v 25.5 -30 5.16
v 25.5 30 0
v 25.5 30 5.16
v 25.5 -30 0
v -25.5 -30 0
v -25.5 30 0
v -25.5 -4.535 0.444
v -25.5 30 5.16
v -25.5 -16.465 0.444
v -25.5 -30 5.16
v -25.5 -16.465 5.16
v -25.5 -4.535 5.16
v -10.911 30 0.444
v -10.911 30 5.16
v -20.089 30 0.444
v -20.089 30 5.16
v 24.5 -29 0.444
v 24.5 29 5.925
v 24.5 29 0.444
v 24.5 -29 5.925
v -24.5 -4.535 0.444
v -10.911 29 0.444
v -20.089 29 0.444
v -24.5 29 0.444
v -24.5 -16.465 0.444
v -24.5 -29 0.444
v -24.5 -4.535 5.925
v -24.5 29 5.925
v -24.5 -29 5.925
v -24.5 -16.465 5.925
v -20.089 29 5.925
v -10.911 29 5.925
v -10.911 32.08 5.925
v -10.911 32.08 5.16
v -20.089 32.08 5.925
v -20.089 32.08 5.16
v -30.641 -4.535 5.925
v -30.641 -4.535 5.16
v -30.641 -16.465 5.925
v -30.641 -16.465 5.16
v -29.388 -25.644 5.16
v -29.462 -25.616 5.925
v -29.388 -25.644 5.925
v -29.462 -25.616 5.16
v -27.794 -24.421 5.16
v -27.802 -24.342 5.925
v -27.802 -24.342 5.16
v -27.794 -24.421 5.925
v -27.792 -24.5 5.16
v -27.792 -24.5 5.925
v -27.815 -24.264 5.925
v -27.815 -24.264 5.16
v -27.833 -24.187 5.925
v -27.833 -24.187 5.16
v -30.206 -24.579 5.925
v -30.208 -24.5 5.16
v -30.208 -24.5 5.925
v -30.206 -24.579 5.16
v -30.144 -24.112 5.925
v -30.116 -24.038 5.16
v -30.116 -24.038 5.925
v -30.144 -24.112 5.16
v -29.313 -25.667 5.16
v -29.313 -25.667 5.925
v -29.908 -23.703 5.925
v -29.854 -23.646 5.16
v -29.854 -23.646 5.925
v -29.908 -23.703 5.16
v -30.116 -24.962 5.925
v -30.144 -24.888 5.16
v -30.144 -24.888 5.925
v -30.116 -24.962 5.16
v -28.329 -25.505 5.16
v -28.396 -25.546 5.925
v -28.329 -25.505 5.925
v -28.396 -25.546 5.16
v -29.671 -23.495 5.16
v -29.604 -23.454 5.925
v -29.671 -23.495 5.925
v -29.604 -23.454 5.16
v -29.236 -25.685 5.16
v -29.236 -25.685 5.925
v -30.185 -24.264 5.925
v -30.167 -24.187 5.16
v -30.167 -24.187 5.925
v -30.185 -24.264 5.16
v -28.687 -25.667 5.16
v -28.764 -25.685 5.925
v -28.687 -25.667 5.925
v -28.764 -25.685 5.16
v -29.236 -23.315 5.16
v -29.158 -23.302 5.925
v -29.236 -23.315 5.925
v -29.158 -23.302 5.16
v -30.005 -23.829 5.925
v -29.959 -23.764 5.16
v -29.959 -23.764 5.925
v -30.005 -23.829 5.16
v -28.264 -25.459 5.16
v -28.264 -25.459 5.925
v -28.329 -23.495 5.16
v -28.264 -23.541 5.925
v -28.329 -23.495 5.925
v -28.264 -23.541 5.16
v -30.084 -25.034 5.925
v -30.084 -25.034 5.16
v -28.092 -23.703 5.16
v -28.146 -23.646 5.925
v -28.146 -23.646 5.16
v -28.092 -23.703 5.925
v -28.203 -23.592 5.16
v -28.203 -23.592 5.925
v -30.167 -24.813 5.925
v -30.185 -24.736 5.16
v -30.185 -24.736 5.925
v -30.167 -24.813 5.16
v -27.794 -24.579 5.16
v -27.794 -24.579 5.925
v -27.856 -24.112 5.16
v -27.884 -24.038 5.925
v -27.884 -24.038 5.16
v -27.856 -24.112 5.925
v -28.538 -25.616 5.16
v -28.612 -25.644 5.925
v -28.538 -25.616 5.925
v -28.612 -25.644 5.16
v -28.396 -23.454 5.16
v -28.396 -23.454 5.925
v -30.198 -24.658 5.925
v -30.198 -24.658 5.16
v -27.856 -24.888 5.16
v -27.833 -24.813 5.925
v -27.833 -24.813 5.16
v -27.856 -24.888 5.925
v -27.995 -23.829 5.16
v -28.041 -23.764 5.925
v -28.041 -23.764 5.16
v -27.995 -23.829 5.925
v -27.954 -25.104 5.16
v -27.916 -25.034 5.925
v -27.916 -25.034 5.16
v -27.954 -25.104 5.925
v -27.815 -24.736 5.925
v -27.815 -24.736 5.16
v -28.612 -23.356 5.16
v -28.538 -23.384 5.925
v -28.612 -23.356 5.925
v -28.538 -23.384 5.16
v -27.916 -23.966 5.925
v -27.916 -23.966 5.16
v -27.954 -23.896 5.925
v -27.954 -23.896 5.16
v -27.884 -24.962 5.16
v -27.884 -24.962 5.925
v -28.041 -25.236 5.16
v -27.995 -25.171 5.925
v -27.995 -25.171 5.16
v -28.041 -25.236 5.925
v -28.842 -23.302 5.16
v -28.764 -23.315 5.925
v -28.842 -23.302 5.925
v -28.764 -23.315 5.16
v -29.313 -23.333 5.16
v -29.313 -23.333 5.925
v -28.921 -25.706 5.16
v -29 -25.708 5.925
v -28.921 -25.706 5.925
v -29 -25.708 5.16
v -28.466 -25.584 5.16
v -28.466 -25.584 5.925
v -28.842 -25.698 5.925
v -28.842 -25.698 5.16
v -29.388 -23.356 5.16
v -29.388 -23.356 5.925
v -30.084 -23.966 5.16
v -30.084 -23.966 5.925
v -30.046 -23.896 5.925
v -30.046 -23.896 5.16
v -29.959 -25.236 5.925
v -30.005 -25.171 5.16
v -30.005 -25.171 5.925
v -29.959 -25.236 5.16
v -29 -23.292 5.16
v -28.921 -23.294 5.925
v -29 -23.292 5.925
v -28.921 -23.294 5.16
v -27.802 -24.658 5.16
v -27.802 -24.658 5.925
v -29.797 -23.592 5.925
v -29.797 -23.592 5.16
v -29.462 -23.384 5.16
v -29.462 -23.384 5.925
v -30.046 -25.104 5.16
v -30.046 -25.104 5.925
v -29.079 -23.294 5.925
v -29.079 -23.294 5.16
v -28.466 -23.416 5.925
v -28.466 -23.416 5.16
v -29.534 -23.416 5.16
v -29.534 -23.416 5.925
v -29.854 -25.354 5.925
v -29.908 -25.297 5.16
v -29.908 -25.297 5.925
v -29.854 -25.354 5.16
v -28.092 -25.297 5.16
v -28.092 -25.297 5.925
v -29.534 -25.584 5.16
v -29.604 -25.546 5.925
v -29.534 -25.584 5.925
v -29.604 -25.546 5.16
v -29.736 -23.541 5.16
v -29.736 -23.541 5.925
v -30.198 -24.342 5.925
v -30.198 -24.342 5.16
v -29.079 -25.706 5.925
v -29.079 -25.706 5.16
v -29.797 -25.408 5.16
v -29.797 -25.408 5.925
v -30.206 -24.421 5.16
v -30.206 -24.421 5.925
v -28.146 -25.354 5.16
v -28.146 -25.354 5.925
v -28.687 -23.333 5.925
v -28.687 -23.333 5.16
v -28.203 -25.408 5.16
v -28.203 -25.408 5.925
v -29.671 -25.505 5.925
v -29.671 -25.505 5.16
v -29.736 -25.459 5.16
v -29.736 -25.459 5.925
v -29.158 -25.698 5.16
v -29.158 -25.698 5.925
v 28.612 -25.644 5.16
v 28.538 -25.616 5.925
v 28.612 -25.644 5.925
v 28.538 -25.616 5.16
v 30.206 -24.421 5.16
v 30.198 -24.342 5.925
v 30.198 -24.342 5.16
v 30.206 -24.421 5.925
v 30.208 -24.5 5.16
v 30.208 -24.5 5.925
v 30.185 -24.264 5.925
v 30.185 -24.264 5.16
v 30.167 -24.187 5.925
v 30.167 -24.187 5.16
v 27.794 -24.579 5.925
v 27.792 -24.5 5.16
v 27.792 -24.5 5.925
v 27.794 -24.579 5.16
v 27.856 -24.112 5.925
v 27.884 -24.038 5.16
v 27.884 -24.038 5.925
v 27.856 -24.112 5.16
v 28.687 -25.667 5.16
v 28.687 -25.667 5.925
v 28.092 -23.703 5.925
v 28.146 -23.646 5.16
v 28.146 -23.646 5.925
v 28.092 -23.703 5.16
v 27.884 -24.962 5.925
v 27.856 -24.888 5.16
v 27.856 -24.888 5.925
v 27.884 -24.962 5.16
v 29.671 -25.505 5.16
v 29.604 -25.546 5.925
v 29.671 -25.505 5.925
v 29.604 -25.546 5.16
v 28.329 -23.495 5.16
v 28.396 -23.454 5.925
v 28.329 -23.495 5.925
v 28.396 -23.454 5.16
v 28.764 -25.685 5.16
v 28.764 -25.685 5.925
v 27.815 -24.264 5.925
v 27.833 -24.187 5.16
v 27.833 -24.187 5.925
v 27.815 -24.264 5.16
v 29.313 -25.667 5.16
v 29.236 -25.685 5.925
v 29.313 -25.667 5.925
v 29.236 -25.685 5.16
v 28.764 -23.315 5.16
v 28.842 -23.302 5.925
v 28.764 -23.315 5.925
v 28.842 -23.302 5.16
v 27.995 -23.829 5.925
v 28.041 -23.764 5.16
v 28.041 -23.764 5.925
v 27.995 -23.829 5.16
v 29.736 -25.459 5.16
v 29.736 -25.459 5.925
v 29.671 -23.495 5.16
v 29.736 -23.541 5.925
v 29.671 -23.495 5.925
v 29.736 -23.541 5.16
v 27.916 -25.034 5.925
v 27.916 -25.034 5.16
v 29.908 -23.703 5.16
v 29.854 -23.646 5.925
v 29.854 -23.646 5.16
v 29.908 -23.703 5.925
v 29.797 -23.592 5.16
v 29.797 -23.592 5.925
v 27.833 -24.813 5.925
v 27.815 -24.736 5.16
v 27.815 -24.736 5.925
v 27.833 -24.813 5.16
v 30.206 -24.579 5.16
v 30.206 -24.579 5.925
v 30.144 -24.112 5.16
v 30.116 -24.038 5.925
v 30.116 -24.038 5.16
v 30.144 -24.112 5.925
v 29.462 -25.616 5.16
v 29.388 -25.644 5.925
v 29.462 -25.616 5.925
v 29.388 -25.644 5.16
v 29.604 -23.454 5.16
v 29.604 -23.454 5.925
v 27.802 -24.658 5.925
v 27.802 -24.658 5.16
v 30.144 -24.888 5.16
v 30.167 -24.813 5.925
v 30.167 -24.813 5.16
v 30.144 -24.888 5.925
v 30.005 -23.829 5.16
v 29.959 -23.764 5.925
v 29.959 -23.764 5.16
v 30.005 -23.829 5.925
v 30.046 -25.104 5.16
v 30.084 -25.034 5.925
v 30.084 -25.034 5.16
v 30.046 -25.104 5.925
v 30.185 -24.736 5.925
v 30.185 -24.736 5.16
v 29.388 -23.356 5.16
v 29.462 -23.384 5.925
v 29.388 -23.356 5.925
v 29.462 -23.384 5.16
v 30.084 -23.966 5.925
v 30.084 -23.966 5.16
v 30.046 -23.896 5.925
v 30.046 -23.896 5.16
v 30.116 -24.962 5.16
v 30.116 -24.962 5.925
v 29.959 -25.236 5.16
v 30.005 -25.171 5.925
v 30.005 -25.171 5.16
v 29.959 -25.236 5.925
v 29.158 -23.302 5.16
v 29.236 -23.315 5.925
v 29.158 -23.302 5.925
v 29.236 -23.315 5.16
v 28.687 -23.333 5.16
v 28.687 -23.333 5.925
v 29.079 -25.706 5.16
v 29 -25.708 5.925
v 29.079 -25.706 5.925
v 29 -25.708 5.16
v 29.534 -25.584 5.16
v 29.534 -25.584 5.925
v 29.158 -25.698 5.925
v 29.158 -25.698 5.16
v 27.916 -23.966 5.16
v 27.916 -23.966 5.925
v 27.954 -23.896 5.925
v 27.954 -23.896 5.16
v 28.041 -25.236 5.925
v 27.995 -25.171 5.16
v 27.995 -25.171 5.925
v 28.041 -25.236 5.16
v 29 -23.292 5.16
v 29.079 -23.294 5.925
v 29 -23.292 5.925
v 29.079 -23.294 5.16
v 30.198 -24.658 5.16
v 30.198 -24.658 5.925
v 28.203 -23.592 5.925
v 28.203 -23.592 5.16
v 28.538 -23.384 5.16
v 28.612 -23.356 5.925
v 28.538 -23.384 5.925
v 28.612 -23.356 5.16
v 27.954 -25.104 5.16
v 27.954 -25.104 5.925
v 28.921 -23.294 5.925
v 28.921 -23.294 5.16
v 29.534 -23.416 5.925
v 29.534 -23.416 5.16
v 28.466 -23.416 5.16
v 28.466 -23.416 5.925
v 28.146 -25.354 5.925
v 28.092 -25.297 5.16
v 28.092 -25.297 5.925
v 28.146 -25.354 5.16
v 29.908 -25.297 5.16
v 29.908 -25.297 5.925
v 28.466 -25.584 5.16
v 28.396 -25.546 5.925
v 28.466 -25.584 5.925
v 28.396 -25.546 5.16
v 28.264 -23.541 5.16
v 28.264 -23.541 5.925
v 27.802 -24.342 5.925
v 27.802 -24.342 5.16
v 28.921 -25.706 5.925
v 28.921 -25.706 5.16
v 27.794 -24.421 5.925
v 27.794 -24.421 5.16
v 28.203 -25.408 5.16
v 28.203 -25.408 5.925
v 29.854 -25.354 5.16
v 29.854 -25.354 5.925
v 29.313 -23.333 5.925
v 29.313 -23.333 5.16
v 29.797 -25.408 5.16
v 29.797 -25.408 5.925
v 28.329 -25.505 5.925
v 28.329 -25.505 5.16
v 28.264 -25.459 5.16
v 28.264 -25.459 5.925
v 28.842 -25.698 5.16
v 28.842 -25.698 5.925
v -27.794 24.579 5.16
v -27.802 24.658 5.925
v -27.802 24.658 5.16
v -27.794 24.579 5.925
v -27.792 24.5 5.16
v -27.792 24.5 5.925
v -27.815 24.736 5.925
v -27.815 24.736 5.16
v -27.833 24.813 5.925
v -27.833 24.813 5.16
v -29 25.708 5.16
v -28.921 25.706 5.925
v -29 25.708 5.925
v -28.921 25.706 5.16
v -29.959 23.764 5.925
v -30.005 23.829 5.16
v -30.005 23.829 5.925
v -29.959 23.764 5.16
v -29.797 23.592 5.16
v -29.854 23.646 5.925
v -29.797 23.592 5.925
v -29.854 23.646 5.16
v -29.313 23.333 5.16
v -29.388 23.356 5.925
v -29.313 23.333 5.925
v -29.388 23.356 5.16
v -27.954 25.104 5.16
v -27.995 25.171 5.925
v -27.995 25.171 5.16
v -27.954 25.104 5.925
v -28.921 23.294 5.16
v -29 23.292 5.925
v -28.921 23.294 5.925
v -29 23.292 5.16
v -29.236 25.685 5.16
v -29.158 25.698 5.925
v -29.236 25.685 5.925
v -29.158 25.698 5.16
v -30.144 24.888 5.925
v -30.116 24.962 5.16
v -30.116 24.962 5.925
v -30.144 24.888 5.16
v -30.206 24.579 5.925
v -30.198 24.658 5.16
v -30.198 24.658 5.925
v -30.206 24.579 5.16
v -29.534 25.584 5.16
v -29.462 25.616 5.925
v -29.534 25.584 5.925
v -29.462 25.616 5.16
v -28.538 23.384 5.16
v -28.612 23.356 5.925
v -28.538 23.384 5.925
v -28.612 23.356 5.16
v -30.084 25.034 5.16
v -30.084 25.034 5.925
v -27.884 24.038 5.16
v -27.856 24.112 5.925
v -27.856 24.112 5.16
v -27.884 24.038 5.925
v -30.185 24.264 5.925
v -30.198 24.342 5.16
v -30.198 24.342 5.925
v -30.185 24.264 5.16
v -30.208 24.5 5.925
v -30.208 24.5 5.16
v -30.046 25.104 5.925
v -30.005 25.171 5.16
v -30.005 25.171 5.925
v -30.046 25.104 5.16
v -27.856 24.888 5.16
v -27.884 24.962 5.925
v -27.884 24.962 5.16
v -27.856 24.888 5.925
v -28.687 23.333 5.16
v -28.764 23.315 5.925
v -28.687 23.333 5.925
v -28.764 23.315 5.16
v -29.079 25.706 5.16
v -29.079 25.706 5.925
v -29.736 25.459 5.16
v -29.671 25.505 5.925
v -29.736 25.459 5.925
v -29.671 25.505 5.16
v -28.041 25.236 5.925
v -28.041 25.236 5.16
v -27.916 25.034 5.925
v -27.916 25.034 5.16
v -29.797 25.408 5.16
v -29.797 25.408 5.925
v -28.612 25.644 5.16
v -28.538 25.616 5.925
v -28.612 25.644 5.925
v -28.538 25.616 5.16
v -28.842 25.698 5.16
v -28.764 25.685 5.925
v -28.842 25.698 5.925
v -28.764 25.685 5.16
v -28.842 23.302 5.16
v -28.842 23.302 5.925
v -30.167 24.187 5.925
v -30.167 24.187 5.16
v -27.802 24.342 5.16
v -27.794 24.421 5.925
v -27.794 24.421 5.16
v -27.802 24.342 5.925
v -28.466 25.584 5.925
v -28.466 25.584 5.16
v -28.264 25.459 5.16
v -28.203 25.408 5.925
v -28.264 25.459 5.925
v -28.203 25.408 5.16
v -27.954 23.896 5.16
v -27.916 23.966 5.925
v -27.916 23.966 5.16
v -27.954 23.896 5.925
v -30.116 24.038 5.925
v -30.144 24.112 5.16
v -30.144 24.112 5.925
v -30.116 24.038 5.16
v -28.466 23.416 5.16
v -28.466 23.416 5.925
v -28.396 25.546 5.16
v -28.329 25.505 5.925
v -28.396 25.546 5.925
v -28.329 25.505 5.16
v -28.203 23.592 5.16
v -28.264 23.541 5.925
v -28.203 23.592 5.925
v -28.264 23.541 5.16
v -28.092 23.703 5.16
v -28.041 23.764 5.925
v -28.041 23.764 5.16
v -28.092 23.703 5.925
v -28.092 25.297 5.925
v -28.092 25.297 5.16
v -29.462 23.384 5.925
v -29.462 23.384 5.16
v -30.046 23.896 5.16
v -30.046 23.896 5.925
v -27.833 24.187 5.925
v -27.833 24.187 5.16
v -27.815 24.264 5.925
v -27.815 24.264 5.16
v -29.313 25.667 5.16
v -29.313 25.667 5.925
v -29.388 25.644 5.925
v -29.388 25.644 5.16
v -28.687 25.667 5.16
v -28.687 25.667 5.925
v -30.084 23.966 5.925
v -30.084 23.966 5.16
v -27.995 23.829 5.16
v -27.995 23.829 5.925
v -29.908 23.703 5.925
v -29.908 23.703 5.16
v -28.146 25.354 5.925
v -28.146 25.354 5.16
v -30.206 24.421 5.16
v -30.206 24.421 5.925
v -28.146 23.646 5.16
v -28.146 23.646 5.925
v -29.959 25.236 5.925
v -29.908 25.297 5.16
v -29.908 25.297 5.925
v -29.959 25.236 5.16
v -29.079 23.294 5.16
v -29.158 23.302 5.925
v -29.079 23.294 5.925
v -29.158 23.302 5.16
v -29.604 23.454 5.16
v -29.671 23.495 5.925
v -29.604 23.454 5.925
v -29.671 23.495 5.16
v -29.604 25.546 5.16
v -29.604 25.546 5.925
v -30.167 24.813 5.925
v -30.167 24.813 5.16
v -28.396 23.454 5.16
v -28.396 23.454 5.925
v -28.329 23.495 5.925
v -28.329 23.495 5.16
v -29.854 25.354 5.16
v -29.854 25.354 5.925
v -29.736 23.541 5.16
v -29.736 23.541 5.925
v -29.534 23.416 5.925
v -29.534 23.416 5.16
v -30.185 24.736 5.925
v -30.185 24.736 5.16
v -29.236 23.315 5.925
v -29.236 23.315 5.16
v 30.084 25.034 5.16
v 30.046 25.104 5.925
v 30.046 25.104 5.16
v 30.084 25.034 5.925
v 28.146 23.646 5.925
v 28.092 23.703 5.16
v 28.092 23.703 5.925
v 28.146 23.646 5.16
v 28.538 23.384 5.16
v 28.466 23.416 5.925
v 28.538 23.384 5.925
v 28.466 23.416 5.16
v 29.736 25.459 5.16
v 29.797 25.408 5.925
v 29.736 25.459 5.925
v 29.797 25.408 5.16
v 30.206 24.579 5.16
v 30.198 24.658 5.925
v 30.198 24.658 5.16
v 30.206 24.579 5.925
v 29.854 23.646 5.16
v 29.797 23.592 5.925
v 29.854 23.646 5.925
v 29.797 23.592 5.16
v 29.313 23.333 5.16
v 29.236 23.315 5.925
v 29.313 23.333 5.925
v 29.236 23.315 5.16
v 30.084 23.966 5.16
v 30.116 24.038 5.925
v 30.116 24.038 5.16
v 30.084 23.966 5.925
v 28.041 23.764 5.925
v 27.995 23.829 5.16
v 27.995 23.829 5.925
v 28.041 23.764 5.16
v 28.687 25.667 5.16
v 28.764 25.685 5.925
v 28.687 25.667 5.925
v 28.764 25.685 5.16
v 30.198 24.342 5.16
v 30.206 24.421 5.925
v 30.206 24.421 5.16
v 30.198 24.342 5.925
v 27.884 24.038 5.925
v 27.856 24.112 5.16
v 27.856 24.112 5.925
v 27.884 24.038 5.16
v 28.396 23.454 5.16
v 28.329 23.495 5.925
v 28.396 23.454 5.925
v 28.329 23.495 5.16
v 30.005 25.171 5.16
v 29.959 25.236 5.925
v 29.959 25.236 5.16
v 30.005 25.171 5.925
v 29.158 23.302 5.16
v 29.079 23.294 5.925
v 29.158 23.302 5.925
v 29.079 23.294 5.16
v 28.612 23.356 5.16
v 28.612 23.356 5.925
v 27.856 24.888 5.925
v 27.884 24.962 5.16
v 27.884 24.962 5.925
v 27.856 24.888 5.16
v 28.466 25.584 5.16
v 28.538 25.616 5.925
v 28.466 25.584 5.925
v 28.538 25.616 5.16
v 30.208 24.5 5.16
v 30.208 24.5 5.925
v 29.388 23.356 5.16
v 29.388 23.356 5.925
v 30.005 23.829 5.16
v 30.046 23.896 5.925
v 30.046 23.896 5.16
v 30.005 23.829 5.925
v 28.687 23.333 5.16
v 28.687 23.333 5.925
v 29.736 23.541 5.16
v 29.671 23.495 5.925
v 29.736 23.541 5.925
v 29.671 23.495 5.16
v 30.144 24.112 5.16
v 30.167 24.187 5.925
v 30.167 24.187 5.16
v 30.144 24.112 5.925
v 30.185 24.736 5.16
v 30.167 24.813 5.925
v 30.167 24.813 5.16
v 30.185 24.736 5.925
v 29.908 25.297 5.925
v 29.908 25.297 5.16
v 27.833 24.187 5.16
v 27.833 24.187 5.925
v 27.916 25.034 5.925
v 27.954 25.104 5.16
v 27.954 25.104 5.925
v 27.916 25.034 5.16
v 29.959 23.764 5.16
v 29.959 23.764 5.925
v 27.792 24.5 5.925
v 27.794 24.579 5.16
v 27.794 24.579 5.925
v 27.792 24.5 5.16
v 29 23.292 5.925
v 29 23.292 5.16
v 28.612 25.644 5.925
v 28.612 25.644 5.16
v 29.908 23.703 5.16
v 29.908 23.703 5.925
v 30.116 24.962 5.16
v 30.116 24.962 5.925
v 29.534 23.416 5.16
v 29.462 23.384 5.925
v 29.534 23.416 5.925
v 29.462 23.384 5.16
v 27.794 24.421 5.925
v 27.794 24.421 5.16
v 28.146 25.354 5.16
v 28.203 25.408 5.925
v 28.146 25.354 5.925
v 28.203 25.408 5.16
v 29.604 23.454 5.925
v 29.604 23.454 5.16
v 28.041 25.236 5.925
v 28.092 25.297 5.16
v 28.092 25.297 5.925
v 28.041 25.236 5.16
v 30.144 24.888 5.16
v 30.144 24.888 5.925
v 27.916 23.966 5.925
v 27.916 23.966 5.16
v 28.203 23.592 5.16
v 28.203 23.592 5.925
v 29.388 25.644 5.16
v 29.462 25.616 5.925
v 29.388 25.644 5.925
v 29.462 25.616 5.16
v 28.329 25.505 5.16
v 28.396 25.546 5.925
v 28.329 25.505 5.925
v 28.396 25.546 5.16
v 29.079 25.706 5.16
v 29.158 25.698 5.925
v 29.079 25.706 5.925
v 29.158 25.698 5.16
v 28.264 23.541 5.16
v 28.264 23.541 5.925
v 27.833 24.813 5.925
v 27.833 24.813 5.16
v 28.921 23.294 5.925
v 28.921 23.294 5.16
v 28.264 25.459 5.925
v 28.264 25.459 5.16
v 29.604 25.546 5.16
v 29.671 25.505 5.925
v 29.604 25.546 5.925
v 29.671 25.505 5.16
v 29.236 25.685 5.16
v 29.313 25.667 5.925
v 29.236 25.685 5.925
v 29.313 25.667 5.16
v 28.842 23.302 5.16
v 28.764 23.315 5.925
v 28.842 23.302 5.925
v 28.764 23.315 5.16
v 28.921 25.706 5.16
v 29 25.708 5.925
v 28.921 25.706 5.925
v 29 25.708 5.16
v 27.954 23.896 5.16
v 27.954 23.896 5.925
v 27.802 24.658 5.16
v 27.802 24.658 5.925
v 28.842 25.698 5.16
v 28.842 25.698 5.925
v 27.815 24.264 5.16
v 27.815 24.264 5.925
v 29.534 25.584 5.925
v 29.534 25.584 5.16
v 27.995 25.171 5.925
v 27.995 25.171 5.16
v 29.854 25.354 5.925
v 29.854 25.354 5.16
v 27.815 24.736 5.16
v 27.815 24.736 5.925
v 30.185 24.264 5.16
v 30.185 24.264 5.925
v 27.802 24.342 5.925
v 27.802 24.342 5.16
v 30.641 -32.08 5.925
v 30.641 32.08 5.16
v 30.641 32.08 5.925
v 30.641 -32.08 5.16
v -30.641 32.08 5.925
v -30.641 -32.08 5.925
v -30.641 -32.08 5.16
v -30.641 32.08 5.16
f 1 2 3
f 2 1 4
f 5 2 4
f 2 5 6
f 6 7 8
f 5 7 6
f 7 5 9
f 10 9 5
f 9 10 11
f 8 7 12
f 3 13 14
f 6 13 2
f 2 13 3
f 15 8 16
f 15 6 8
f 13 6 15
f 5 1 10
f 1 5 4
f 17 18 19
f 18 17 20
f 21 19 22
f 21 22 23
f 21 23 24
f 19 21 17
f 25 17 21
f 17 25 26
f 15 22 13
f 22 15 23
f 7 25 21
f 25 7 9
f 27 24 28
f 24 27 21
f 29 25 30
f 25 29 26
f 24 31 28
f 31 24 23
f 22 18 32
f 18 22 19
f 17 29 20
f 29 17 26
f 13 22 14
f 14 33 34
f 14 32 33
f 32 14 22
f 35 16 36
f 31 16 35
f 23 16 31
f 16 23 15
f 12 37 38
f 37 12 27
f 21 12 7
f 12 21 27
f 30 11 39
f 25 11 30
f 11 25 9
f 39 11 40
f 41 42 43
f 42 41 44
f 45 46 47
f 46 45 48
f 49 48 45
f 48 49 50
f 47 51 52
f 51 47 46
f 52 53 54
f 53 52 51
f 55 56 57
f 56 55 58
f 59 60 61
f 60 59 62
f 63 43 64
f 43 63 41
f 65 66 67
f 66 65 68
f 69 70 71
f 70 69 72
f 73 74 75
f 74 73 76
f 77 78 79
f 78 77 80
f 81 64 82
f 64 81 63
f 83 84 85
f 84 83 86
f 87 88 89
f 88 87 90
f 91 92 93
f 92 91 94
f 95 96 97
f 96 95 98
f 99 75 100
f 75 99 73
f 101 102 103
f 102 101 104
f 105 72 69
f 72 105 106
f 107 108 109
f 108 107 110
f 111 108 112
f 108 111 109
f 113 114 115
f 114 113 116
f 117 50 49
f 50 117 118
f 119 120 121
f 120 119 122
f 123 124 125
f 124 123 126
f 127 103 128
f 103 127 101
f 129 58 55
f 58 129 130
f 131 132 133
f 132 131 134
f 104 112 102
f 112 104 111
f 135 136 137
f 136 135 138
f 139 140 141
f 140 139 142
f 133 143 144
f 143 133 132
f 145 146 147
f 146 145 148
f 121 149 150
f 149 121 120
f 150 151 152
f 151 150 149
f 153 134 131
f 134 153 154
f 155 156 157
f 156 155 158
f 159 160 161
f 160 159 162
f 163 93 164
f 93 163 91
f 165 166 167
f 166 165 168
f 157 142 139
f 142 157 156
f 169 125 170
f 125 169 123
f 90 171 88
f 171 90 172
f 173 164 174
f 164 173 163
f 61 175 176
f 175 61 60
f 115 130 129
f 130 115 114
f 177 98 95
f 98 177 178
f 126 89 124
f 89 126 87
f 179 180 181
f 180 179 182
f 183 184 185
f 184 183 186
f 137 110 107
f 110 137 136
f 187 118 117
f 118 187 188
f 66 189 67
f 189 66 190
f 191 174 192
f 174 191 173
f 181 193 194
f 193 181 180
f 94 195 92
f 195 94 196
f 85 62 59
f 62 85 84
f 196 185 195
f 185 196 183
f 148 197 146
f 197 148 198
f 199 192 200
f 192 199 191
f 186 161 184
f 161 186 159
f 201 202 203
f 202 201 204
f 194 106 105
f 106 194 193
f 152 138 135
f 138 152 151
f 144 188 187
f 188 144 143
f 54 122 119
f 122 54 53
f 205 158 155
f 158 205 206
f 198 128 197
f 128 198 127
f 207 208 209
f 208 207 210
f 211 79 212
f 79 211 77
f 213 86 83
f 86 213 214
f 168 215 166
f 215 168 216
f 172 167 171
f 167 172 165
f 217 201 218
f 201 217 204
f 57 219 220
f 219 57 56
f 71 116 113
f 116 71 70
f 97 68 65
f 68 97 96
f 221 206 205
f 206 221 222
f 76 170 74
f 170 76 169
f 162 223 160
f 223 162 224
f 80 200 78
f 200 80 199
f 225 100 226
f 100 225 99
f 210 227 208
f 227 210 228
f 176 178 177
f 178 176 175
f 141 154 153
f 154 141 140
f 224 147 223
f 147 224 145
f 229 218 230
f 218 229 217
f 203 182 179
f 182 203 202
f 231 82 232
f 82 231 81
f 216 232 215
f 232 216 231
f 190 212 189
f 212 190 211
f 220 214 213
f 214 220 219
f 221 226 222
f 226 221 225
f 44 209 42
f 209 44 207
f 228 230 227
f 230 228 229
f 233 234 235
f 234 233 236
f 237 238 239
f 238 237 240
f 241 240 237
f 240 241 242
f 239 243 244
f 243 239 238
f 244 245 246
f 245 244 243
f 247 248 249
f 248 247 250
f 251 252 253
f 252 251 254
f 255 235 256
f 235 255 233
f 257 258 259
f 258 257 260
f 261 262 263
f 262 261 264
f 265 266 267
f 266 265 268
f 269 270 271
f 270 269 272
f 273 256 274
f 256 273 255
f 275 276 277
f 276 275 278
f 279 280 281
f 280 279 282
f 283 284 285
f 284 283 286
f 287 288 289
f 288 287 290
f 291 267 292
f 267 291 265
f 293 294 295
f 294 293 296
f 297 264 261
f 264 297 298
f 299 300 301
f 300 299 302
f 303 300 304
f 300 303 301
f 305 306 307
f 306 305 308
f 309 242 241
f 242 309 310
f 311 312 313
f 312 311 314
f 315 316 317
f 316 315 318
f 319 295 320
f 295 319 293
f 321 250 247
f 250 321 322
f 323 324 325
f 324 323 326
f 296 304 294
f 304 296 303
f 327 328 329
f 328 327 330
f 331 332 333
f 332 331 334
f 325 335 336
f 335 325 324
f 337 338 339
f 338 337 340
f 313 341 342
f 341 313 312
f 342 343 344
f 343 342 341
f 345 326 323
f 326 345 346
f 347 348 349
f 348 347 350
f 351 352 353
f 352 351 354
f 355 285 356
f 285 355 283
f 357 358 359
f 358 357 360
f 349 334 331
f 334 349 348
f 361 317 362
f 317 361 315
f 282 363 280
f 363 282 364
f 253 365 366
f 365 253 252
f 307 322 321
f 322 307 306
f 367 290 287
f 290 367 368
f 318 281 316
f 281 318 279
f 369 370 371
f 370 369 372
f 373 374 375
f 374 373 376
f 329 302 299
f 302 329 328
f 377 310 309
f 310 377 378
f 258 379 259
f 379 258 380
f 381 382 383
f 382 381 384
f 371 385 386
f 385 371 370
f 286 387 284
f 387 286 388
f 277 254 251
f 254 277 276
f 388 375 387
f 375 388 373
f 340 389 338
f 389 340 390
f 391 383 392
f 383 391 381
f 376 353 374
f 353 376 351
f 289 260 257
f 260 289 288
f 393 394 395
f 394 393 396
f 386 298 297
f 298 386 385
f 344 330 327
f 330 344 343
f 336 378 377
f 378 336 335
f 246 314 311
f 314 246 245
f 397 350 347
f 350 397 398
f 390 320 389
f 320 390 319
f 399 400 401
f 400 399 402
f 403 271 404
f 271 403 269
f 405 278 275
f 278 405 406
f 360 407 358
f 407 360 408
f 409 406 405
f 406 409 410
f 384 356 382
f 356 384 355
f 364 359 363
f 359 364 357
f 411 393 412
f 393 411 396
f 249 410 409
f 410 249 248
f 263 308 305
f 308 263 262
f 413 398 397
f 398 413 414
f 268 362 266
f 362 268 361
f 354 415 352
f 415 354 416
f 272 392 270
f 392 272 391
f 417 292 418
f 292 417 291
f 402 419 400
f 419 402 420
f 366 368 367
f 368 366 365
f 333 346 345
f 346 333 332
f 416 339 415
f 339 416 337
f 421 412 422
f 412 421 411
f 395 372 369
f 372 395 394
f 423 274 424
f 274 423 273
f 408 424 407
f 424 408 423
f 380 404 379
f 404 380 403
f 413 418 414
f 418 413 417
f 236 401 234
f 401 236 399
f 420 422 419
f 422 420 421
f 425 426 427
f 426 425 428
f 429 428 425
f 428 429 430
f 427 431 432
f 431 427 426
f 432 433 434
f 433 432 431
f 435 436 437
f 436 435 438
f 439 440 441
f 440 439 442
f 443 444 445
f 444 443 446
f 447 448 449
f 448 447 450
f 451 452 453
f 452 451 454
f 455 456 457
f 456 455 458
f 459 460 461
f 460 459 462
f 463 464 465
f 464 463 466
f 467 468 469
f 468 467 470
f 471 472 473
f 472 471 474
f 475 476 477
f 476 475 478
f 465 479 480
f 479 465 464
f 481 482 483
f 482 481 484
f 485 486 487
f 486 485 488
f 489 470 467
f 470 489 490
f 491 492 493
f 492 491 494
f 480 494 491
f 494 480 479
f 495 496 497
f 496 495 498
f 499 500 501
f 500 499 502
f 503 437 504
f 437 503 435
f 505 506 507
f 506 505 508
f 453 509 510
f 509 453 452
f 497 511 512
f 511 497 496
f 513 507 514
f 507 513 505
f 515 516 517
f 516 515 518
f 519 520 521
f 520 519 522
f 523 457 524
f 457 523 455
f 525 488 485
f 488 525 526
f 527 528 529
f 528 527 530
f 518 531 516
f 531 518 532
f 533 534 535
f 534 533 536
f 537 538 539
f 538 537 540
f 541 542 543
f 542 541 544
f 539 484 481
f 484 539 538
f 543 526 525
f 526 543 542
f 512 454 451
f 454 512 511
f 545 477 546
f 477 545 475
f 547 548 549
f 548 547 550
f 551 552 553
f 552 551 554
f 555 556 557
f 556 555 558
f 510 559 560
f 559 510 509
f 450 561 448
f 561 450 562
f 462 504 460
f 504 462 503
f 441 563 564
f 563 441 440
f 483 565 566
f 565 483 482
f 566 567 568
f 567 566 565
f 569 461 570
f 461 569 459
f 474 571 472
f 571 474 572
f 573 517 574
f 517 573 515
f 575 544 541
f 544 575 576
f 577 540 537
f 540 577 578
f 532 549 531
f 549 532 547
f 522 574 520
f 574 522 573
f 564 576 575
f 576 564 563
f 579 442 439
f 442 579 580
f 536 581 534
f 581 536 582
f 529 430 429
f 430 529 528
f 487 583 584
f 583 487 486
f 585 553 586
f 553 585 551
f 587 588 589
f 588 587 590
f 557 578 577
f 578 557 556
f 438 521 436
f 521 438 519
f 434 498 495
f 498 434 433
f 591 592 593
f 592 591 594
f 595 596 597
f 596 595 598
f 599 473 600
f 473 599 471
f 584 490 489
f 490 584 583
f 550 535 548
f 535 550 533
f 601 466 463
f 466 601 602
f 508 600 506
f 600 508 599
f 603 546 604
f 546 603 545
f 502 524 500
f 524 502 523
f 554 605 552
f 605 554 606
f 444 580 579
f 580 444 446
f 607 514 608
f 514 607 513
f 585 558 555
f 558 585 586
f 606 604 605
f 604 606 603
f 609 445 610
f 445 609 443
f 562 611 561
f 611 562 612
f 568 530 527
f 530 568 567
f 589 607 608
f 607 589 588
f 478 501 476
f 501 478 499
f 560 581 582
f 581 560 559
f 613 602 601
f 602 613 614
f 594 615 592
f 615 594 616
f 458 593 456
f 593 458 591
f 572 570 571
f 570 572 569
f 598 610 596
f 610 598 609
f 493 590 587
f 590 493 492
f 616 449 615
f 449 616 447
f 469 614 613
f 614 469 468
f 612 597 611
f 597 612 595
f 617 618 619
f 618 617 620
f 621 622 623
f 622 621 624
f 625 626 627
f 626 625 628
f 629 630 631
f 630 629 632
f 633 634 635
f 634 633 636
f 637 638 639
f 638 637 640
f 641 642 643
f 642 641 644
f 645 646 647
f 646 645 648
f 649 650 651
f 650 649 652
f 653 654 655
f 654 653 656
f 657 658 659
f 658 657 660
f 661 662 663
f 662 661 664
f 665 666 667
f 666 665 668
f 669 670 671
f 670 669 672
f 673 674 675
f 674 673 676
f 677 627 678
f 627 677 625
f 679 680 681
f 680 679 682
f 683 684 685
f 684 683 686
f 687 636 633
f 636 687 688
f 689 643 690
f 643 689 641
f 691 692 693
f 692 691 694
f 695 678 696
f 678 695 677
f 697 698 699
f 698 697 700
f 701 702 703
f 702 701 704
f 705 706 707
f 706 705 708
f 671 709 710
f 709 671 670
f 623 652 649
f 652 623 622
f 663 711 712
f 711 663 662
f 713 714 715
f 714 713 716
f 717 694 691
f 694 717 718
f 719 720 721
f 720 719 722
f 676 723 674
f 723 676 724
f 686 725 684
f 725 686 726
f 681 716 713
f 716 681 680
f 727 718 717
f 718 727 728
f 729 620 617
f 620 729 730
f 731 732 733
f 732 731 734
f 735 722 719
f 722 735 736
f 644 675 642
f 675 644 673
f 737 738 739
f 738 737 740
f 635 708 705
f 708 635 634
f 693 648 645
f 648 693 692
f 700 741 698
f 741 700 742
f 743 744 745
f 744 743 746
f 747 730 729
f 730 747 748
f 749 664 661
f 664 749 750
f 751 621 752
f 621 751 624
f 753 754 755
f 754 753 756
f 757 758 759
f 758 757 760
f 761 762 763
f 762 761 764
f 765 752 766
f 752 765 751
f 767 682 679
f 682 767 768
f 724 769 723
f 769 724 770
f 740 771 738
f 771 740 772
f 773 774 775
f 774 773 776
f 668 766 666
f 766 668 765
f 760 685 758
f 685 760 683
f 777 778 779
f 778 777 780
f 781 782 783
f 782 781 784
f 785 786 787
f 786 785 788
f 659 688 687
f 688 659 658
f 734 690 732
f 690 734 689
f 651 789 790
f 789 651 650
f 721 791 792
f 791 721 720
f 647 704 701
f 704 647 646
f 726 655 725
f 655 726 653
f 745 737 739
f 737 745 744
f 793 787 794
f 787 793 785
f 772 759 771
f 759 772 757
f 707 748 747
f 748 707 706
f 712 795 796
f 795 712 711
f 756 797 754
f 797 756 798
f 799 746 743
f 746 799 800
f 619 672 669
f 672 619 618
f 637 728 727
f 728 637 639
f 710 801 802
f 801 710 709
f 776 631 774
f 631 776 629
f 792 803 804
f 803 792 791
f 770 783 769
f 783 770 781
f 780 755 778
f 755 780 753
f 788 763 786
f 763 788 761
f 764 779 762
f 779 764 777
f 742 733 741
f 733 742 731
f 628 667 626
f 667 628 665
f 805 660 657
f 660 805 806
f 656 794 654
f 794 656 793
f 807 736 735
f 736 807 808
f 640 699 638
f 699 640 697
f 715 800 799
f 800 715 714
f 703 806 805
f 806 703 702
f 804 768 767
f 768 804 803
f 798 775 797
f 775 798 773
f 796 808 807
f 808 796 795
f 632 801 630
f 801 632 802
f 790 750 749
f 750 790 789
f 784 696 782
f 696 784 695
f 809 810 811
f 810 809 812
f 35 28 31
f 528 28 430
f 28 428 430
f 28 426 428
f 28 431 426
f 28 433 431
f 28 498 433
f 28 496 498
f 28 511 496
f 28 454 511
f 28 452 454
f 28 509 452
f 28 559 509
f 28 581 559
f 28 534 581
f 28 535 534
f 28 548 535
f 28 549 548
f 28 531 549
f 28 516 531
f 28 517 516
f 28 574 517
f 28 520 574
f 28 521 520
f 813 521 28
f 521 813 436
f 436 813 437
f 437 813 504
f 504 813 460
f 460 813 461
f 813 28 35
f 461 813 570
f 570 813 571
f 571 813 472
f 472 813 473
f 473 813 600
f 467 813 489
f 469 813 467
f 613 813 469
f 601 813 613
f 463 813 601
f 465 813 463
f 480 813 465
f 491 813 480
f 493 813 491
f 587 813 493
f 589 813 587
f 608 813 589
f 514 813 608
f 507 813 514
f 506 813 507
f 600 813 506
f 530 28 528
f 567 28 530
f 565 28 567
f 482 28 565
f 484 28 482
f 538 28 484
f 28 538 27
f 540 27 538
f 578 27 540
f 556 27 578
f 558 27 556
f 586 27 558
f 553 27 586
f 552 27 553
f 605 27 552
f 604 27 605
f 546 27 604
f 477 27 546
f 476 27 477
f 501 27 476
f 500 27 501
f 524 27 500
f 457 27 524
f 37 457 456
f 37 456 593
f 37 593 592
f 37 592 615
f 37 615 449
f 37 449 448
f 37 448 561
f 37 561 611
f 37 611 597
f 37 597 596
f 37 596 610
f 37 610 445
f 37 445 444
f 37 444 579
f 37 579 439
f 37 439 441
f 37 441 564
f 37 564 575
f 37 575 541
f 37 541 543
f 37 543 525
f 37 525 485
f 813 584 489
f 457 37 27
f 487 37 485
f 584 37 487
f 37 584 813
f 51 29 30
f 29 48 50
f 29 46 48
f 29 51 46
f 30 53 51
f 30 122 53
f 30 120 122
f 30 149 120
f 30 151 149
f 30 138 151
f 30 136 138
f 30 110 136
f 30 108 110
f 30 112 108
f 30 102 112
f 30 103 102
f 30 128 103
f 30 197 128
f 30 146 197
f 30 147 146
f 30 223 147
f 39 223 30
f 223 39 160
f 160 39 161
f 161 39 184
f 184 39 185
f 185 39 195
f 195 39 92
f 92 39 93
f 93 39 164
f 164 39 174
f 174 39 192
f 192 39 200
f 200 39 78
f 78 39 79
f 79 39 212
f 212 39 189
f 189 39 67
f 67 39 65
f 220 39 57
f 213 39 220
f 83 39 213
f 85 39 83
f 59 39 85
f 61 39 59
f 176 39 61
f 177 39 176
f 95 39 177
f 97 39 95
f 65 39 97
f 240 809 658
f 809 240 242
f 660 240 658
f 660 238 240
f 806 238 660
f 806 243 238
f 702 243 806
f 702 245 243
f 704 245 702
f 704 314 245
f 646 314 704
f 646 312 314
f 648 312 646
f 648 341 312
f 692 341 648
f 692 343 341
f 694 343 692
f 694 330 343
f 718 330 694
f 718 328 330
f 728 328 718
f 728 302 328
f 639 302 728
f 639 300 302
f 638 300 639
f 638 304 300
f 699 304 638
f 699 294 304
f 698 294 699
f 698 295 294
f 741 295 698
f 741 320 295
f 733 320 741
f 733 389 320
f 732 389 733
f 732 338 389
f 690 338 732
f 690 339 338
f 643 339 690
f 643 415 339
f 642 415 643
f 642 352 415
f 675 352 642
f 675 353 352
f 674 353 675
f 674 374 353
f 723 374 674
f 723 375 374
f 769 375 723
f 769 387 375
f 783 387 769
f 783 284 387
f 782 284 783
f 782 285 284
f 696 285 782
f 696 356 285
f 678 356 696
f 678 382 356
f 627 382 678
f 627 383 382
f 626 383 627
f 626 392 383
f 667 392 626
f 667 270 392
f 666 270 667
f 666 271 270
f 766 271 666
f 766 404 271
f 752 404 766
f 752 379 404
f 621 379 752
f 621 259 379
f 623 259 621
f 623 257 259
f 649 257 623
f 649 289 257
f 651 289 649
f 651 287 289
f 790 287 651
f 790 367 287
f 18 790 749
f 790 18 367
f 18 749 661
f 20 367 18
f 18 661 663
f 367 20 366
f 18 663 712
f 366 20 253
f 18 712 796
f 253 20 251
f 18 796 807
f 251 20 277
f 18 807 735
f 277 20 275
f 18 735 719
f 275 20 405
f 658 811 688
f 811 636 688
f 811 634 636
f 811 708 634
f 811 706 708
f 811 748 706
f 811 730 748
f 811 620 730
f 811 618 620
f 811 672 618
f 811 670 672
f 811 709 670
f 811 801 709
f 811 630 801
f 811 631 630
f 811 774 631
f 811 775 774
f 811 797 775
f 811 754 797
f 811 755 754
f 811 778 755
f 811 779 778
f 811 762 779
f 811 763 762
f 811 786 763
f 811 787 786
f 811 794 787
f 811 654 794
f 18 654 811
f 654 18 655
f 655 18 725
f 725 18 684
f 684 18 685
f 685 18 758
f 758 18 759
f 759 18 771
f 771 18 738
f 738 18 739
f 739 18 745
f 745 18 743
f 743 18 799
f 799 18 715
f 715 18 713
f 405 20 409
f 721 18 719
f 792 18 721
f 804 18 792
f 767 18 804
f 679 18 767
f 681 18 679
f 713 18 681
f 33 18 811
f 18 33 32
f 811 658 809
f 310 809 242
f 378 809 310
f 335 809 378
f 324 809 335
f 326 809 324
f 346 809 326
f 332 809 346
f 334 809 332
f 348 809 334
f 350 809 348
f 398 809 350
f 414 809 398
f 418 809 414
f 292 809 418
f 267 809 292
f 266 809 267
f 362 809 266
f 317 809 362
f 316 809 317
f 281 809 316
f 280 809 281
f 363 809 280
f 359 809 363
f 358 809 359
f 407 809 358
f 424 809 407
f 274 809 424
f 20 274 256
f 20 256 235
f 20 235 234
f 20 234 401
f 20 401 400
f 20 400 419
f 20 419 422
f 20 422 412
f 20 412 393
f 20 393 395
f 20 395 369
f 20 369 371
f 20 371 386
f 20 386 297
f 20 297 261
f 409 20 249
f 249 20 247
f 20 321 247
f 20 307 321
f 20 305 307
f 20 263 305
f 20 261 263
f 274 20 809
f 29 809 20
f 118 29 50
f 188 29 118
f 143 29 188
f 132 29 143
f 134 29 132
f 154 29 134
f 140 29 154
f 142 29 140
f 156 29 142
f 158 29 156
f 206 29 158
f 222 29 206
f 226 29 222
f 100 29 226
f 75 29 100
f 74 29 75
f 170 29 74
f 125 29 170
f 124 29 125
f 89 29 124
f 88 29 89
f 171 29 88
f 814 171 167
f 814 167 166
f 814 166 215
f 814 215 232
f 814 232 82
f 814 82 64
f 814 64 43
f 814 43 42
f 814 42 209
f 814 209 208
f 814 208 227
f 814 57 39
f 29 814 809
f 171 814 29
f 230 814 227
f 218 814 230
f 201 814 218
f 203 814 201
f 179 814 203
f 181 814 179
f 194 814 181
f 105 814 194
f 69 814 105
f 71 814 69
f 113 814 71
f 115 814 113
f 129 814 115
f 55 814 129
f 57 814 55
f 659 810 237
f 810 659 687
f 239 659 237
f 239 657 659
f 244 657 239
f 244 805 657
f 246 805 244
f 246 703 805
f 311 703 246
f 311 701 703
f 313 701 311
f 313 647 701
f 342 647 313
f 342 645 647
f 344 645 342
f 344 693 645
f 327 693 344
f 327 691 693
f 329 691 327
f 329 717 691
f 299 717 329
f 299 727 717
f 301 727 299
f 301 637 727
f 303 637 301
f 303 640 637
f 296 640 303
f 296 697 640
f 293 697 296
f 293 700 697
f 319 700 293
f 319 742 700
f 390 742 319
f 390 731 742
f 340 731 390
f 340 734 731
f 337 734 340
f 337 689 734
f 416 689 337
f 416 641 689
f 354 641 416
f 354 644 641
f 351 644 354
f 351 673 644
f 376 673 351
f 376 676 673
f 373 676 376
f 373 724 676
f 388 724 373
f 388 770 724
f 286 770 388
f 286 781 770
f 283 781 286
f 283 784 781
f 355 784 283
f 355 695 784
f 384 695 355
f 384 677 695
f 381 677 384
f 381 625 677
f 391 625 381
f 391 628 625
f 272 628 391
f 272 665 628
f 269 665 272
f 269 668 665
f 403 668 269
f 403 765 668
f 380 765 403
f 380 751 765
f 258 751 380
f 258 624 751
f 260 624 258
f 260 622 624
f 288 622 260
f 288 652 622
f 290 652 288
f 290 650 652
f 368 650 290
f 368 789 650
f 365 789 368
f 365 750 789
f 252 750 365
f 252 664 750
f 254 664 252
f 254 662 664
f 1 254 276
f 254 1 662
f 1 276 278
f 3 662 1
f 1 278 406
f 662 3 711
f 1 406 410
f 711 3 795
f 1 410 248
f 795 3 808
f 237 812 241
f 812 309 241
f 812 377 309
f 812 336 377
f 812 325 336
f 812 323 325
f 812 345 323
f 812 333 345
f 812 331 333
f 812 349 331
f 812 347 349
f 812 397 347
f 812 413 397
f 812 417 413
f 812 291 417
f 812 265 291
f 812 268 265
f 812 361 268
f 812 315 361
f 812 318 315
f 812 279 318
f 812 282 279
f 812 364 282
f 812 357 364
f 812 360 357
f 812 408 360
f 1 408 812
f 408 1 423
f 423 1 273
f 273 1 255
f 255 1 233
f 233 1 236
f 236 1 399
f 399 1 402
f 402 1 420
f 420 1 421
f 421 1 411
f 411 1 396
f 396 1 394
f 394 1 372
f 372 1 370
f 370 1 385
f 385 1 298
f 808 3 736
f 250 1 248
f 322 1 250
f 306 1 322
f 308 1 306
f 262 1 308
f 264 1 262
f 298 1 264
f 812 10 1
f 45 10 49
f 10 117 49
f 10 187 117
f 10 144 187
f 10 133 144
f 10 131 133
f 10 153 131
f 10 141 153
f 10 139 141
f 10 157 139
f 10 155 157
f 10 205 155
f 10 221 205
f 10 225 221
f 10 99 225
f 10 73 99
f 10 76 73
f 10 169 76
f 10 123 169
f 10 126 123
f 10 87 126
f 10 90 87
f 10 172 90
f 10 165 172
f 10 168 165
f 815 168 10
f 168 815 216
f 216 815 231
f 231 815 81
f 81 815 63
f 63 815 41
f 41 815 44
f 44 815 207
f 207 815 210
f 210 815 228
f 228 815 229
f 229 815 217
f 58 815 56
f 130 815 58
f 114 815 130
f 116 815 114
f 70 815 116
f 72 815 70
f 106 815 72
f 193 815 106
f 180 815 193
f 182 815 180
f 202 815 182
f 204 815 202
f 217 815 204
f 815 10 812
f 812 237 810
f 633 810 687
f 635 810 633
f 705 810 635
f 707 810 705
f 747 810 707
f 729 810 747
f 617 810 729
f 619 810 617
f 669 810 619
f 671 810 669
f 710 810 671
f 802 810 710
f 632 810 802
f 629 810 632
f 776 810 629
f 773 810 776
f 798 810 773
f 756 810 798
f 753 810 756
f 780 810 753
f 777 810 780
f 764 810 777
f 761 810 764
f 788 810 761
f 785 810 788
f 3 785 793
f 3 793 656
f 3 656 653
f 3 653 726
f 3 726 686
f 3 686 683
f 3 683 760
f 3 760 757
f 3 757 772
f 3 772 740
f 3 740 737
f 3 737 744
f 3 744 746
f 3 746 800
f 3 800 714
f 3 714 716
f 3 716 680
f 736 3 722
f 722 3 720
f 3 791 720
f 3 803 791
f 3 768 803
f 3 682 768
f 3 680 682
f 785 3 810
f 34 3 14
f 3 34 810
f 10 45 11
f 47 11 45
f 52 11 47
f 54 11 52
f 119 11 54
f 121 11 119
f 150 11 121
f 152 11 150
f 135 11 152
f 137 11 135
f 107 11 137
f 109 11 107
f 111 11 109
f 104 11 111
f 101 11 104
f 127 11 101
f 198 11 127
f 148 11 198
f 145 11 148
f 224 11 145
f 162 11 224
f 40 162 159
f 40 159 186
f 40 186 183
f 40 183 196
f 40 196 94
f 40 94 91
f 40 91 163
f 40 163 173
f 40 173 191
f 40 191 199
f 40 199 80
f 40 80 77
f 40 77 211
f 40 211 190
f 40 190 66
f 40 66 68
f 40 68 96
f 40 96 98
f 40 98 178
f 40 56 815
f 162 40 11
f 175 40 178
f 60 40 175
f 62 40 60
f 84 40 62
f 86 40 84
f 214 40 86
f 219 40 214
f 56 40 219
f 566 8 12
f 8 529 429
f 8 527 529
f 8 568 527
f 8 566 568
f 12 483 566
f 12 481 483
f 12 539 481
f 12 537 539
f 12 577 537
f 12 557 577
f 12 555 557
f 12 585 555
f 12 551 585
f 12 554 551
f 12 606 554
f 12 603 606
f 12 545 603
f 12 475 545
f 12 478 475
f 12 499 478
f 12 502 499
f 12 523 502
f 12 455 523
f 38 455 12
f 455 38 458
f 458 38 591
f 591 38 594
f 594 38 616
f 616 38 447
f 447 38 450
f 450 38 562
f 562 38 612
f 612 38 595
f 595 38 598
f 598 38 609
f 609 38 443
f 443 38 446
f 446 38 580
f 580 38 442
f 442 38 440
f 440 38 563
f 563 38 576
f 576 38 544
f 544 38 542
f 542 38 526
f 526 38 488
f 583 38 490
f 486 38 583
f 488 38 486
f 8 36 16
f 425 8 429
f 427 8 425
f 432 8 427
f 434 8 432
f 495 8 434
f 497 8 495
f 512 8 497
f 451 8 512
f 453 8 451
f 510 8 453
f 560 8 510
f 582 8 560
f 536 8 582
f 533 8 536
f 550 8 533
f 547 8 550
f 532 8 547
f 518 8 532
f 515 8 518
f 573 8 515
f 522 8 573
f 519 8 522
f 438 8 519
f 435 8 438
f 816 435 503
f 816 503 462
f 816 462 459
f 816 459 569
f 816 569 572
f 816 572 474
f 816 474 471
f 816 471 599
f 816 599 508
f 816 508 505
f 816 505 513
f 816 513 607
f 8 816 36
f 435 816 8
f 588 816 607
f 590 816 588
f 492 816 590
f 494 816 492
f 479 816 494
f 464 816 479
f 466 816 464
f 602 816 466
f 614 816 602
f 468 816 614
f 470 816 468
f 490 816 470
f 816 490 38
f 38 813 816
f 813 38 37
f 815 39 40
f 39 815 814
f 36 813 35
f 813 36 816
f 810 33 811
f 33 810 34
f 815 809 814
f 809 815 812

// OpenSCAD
// ============================================================
// Battery_Holder_tunable.scad
// Generated by Battery Holder Designer
//
// The battery and screw hardware are reference geometry only.
// They appear in preview when enabled but are not exported.
// ============================================================

$fn = 96;

// ---------------- HOLDER ----------------
overall_w = 61.2827;
overall_d = 64.1609;
overall_h = 5.9252;

floor_t = 0.44385;
wall_h = 5.18313;
flange_t = 0.765216;
tray_wall_t = 1;
flange_z = overall_h - flange_t;

// ---------------- BATTERY / POCKET ----------------
battery_w = 48;
battery_d = 57;
battery_h = 5;
clearance_x = 0.5;
clearance_y = 0.5;
battery_offset_x = 0;
battery_offset_y = 0;

pocket_w = battery_w + clearance_x * 2;
pocket_d = battery_d + clearance_y * 2;
pocket_x0 = battery_offset_x - pocket_w / 2;
pocket_y0 = battery_offset_y - pocket_d / 2;

// ---------------- SCREW PATTERN ----------------
hole_pitch_x = 58;
hole_pitch_y = 49;
hole_d = 2.41639;
underside_hardware_d = 5.4;
hardware_reference_h = 6;

hole_x = hole_pitch_x / 2;
hole_y = hole_pitch_y / 2;
hole_positions = [
    [-hole_x, -hole_y],
    [ hole_x, -hole_y],
    [-hole_x,  hole_y],
    [ hole_x,  hole_y]
];

// ---------------- OPENINGS ----------------
// Rear opening is cut in from +Y edge and through the rear tray wall.
rear_notch_w = 9.17705;
rear_notch_x = -15.5;
rear_notch_extra_into_pocket = 1.25;

// Side opening is cut in from -X edge and through the left tray wall.
side_notch_d = 11.9299;
side_notch_y = -10.5;
side_notch_extra_into_pocket = 1.25;

// ---------------- PREVIEW REFERENCES ----------------
show_battery_reference = true;
show_hardware_references = true;
show_original_stl = false;
original_stl_path = "";
stl_scale = 1000;
stl_translate = [0, 0, 0];
stl_rotate = [0, 0, 0];

// ============================================================
// CUTTERS
// ============================================================

module mounting_hole(x, y) {
    translate([x, y, flange_z - 0.1])
        cylinder(h = flange_t + 0.3, d = hole_d);
}

module rear_notch_cut(z_start = floor_t, cut_h = overall_h + 1) {
    translate([
        rear_notch_x - rear_notch_w / 2,
        pocket_y0 + pocket_d - tray_wall_t - 0.01,
        z_start
    ])
        cube([
            rear_notch_w,
            overall_d / 2 - (pocket_y0 + pocket_d)
                + tray_wall_t + rear_notch_extra_into_pocket + 0.02,
            cut_h
        ]);
}

module side_notch_cut(z_start = floor_t, cut_h = overall_h + 1) {
    translate([
        -overall_w / 2 - 0.01,
        side_notch_y - side_notch_d / 2,
        z_start
    ])
        cube([
            pocket_x0 - (-overall_w / 2)
                + tray_wall_t + side_notch_extra_into_pocket + 0.02,
            side_notch_d,
            cut_h
        ]);
}

// ============================================================
// HOLDER GEOMETRY
// ============================================================

module battery_floor() {
    translate([pocket_x0, pocket_y0, 0])
        cube([pocket_w, pocket_d, floor_t]);
}

module tray_walls_uncut() {
    difference() {
        translate([
            pocket_x0 - tray_wall_t,
            pocket_y0 - tray_wall_t,
            0
        ])
            cube([
                pocket_w + tray_wall_t * 2,
                pocket_d + tray_wall_t * 2,
                wall_h
            ]);

        translate([pocket_x0, pocket_y0, floor_t])
            cube([pocket_w, pocket_d, wall_h + 1]);
    }
}

module tray_walls() {
    difference() {
        tray_walls_uncut();

        // BOTH openings cut through the supporting vertical tray walls.
        rear_notch_cut();
        side_notch_cut();
    }
}

module top_flange() {
    difference() {
        translate([-overall_w/2, -overall_d/2, flange_z])
            cube([overall_w, overall_d, flange_t]);

        translate([pocket_x0, pocket_y0, flange_z - 0.1])
            cube([pocket_w, pocket_d, flange_t + 0.3]);

        // BOTH openings cut through the top flange.
        rear_notch_cut(flange_z - 0.1, flange_t + 0.3);
        side_notch_cut(flange_z - 0.1, flange_t + 0.3);

        for (pos = hole_positions)
            mounting_hole(pos[0], pos[1]);
    }
}

module battery_holder() {
    union() {
        battery_floor();
        tray_walls();
        top_flange();
    }
}

// ============================================================
// PREVIEW-ONLY REFERENCE GEOMETRY
// ============================================================

module battery_reference() {
    %color("DodgerBlue", 0.35)
        translate([
            battery_offset_x - battery_w/2,
            battery_offset_y - battery_d/2,
            floor_t
        ])
            cube([battery_w, battery_d, battery_h]);
}

module hardware_references() {
    for (pos = hole_positions) {
        %color("Crimson", 0.45)
            translate([pos[0], pos[1], flange_z - hardware_reference_h])
                cylinder(h = hardware_reference_h, d = underside_hardware_d);
    }
}

module original_stl_reference() {
    if (original_stl_path != "")
        %color("LimeGreen", 0.22)
            translate(stl_translate)
                rotate(stl_rotate)
                    scale([stl_scale, stl_scale, stl_scale])
                        import(original_stl_path, convexity = 10);
}

// ============================================================
// OUTPUT
// ============================================================

battery_holder();

if (show_battery_reference)
    battery_reference();

if (show_hardware_references)
    hardware_references();

if (show_original_stl)
    original_stl_reference();
